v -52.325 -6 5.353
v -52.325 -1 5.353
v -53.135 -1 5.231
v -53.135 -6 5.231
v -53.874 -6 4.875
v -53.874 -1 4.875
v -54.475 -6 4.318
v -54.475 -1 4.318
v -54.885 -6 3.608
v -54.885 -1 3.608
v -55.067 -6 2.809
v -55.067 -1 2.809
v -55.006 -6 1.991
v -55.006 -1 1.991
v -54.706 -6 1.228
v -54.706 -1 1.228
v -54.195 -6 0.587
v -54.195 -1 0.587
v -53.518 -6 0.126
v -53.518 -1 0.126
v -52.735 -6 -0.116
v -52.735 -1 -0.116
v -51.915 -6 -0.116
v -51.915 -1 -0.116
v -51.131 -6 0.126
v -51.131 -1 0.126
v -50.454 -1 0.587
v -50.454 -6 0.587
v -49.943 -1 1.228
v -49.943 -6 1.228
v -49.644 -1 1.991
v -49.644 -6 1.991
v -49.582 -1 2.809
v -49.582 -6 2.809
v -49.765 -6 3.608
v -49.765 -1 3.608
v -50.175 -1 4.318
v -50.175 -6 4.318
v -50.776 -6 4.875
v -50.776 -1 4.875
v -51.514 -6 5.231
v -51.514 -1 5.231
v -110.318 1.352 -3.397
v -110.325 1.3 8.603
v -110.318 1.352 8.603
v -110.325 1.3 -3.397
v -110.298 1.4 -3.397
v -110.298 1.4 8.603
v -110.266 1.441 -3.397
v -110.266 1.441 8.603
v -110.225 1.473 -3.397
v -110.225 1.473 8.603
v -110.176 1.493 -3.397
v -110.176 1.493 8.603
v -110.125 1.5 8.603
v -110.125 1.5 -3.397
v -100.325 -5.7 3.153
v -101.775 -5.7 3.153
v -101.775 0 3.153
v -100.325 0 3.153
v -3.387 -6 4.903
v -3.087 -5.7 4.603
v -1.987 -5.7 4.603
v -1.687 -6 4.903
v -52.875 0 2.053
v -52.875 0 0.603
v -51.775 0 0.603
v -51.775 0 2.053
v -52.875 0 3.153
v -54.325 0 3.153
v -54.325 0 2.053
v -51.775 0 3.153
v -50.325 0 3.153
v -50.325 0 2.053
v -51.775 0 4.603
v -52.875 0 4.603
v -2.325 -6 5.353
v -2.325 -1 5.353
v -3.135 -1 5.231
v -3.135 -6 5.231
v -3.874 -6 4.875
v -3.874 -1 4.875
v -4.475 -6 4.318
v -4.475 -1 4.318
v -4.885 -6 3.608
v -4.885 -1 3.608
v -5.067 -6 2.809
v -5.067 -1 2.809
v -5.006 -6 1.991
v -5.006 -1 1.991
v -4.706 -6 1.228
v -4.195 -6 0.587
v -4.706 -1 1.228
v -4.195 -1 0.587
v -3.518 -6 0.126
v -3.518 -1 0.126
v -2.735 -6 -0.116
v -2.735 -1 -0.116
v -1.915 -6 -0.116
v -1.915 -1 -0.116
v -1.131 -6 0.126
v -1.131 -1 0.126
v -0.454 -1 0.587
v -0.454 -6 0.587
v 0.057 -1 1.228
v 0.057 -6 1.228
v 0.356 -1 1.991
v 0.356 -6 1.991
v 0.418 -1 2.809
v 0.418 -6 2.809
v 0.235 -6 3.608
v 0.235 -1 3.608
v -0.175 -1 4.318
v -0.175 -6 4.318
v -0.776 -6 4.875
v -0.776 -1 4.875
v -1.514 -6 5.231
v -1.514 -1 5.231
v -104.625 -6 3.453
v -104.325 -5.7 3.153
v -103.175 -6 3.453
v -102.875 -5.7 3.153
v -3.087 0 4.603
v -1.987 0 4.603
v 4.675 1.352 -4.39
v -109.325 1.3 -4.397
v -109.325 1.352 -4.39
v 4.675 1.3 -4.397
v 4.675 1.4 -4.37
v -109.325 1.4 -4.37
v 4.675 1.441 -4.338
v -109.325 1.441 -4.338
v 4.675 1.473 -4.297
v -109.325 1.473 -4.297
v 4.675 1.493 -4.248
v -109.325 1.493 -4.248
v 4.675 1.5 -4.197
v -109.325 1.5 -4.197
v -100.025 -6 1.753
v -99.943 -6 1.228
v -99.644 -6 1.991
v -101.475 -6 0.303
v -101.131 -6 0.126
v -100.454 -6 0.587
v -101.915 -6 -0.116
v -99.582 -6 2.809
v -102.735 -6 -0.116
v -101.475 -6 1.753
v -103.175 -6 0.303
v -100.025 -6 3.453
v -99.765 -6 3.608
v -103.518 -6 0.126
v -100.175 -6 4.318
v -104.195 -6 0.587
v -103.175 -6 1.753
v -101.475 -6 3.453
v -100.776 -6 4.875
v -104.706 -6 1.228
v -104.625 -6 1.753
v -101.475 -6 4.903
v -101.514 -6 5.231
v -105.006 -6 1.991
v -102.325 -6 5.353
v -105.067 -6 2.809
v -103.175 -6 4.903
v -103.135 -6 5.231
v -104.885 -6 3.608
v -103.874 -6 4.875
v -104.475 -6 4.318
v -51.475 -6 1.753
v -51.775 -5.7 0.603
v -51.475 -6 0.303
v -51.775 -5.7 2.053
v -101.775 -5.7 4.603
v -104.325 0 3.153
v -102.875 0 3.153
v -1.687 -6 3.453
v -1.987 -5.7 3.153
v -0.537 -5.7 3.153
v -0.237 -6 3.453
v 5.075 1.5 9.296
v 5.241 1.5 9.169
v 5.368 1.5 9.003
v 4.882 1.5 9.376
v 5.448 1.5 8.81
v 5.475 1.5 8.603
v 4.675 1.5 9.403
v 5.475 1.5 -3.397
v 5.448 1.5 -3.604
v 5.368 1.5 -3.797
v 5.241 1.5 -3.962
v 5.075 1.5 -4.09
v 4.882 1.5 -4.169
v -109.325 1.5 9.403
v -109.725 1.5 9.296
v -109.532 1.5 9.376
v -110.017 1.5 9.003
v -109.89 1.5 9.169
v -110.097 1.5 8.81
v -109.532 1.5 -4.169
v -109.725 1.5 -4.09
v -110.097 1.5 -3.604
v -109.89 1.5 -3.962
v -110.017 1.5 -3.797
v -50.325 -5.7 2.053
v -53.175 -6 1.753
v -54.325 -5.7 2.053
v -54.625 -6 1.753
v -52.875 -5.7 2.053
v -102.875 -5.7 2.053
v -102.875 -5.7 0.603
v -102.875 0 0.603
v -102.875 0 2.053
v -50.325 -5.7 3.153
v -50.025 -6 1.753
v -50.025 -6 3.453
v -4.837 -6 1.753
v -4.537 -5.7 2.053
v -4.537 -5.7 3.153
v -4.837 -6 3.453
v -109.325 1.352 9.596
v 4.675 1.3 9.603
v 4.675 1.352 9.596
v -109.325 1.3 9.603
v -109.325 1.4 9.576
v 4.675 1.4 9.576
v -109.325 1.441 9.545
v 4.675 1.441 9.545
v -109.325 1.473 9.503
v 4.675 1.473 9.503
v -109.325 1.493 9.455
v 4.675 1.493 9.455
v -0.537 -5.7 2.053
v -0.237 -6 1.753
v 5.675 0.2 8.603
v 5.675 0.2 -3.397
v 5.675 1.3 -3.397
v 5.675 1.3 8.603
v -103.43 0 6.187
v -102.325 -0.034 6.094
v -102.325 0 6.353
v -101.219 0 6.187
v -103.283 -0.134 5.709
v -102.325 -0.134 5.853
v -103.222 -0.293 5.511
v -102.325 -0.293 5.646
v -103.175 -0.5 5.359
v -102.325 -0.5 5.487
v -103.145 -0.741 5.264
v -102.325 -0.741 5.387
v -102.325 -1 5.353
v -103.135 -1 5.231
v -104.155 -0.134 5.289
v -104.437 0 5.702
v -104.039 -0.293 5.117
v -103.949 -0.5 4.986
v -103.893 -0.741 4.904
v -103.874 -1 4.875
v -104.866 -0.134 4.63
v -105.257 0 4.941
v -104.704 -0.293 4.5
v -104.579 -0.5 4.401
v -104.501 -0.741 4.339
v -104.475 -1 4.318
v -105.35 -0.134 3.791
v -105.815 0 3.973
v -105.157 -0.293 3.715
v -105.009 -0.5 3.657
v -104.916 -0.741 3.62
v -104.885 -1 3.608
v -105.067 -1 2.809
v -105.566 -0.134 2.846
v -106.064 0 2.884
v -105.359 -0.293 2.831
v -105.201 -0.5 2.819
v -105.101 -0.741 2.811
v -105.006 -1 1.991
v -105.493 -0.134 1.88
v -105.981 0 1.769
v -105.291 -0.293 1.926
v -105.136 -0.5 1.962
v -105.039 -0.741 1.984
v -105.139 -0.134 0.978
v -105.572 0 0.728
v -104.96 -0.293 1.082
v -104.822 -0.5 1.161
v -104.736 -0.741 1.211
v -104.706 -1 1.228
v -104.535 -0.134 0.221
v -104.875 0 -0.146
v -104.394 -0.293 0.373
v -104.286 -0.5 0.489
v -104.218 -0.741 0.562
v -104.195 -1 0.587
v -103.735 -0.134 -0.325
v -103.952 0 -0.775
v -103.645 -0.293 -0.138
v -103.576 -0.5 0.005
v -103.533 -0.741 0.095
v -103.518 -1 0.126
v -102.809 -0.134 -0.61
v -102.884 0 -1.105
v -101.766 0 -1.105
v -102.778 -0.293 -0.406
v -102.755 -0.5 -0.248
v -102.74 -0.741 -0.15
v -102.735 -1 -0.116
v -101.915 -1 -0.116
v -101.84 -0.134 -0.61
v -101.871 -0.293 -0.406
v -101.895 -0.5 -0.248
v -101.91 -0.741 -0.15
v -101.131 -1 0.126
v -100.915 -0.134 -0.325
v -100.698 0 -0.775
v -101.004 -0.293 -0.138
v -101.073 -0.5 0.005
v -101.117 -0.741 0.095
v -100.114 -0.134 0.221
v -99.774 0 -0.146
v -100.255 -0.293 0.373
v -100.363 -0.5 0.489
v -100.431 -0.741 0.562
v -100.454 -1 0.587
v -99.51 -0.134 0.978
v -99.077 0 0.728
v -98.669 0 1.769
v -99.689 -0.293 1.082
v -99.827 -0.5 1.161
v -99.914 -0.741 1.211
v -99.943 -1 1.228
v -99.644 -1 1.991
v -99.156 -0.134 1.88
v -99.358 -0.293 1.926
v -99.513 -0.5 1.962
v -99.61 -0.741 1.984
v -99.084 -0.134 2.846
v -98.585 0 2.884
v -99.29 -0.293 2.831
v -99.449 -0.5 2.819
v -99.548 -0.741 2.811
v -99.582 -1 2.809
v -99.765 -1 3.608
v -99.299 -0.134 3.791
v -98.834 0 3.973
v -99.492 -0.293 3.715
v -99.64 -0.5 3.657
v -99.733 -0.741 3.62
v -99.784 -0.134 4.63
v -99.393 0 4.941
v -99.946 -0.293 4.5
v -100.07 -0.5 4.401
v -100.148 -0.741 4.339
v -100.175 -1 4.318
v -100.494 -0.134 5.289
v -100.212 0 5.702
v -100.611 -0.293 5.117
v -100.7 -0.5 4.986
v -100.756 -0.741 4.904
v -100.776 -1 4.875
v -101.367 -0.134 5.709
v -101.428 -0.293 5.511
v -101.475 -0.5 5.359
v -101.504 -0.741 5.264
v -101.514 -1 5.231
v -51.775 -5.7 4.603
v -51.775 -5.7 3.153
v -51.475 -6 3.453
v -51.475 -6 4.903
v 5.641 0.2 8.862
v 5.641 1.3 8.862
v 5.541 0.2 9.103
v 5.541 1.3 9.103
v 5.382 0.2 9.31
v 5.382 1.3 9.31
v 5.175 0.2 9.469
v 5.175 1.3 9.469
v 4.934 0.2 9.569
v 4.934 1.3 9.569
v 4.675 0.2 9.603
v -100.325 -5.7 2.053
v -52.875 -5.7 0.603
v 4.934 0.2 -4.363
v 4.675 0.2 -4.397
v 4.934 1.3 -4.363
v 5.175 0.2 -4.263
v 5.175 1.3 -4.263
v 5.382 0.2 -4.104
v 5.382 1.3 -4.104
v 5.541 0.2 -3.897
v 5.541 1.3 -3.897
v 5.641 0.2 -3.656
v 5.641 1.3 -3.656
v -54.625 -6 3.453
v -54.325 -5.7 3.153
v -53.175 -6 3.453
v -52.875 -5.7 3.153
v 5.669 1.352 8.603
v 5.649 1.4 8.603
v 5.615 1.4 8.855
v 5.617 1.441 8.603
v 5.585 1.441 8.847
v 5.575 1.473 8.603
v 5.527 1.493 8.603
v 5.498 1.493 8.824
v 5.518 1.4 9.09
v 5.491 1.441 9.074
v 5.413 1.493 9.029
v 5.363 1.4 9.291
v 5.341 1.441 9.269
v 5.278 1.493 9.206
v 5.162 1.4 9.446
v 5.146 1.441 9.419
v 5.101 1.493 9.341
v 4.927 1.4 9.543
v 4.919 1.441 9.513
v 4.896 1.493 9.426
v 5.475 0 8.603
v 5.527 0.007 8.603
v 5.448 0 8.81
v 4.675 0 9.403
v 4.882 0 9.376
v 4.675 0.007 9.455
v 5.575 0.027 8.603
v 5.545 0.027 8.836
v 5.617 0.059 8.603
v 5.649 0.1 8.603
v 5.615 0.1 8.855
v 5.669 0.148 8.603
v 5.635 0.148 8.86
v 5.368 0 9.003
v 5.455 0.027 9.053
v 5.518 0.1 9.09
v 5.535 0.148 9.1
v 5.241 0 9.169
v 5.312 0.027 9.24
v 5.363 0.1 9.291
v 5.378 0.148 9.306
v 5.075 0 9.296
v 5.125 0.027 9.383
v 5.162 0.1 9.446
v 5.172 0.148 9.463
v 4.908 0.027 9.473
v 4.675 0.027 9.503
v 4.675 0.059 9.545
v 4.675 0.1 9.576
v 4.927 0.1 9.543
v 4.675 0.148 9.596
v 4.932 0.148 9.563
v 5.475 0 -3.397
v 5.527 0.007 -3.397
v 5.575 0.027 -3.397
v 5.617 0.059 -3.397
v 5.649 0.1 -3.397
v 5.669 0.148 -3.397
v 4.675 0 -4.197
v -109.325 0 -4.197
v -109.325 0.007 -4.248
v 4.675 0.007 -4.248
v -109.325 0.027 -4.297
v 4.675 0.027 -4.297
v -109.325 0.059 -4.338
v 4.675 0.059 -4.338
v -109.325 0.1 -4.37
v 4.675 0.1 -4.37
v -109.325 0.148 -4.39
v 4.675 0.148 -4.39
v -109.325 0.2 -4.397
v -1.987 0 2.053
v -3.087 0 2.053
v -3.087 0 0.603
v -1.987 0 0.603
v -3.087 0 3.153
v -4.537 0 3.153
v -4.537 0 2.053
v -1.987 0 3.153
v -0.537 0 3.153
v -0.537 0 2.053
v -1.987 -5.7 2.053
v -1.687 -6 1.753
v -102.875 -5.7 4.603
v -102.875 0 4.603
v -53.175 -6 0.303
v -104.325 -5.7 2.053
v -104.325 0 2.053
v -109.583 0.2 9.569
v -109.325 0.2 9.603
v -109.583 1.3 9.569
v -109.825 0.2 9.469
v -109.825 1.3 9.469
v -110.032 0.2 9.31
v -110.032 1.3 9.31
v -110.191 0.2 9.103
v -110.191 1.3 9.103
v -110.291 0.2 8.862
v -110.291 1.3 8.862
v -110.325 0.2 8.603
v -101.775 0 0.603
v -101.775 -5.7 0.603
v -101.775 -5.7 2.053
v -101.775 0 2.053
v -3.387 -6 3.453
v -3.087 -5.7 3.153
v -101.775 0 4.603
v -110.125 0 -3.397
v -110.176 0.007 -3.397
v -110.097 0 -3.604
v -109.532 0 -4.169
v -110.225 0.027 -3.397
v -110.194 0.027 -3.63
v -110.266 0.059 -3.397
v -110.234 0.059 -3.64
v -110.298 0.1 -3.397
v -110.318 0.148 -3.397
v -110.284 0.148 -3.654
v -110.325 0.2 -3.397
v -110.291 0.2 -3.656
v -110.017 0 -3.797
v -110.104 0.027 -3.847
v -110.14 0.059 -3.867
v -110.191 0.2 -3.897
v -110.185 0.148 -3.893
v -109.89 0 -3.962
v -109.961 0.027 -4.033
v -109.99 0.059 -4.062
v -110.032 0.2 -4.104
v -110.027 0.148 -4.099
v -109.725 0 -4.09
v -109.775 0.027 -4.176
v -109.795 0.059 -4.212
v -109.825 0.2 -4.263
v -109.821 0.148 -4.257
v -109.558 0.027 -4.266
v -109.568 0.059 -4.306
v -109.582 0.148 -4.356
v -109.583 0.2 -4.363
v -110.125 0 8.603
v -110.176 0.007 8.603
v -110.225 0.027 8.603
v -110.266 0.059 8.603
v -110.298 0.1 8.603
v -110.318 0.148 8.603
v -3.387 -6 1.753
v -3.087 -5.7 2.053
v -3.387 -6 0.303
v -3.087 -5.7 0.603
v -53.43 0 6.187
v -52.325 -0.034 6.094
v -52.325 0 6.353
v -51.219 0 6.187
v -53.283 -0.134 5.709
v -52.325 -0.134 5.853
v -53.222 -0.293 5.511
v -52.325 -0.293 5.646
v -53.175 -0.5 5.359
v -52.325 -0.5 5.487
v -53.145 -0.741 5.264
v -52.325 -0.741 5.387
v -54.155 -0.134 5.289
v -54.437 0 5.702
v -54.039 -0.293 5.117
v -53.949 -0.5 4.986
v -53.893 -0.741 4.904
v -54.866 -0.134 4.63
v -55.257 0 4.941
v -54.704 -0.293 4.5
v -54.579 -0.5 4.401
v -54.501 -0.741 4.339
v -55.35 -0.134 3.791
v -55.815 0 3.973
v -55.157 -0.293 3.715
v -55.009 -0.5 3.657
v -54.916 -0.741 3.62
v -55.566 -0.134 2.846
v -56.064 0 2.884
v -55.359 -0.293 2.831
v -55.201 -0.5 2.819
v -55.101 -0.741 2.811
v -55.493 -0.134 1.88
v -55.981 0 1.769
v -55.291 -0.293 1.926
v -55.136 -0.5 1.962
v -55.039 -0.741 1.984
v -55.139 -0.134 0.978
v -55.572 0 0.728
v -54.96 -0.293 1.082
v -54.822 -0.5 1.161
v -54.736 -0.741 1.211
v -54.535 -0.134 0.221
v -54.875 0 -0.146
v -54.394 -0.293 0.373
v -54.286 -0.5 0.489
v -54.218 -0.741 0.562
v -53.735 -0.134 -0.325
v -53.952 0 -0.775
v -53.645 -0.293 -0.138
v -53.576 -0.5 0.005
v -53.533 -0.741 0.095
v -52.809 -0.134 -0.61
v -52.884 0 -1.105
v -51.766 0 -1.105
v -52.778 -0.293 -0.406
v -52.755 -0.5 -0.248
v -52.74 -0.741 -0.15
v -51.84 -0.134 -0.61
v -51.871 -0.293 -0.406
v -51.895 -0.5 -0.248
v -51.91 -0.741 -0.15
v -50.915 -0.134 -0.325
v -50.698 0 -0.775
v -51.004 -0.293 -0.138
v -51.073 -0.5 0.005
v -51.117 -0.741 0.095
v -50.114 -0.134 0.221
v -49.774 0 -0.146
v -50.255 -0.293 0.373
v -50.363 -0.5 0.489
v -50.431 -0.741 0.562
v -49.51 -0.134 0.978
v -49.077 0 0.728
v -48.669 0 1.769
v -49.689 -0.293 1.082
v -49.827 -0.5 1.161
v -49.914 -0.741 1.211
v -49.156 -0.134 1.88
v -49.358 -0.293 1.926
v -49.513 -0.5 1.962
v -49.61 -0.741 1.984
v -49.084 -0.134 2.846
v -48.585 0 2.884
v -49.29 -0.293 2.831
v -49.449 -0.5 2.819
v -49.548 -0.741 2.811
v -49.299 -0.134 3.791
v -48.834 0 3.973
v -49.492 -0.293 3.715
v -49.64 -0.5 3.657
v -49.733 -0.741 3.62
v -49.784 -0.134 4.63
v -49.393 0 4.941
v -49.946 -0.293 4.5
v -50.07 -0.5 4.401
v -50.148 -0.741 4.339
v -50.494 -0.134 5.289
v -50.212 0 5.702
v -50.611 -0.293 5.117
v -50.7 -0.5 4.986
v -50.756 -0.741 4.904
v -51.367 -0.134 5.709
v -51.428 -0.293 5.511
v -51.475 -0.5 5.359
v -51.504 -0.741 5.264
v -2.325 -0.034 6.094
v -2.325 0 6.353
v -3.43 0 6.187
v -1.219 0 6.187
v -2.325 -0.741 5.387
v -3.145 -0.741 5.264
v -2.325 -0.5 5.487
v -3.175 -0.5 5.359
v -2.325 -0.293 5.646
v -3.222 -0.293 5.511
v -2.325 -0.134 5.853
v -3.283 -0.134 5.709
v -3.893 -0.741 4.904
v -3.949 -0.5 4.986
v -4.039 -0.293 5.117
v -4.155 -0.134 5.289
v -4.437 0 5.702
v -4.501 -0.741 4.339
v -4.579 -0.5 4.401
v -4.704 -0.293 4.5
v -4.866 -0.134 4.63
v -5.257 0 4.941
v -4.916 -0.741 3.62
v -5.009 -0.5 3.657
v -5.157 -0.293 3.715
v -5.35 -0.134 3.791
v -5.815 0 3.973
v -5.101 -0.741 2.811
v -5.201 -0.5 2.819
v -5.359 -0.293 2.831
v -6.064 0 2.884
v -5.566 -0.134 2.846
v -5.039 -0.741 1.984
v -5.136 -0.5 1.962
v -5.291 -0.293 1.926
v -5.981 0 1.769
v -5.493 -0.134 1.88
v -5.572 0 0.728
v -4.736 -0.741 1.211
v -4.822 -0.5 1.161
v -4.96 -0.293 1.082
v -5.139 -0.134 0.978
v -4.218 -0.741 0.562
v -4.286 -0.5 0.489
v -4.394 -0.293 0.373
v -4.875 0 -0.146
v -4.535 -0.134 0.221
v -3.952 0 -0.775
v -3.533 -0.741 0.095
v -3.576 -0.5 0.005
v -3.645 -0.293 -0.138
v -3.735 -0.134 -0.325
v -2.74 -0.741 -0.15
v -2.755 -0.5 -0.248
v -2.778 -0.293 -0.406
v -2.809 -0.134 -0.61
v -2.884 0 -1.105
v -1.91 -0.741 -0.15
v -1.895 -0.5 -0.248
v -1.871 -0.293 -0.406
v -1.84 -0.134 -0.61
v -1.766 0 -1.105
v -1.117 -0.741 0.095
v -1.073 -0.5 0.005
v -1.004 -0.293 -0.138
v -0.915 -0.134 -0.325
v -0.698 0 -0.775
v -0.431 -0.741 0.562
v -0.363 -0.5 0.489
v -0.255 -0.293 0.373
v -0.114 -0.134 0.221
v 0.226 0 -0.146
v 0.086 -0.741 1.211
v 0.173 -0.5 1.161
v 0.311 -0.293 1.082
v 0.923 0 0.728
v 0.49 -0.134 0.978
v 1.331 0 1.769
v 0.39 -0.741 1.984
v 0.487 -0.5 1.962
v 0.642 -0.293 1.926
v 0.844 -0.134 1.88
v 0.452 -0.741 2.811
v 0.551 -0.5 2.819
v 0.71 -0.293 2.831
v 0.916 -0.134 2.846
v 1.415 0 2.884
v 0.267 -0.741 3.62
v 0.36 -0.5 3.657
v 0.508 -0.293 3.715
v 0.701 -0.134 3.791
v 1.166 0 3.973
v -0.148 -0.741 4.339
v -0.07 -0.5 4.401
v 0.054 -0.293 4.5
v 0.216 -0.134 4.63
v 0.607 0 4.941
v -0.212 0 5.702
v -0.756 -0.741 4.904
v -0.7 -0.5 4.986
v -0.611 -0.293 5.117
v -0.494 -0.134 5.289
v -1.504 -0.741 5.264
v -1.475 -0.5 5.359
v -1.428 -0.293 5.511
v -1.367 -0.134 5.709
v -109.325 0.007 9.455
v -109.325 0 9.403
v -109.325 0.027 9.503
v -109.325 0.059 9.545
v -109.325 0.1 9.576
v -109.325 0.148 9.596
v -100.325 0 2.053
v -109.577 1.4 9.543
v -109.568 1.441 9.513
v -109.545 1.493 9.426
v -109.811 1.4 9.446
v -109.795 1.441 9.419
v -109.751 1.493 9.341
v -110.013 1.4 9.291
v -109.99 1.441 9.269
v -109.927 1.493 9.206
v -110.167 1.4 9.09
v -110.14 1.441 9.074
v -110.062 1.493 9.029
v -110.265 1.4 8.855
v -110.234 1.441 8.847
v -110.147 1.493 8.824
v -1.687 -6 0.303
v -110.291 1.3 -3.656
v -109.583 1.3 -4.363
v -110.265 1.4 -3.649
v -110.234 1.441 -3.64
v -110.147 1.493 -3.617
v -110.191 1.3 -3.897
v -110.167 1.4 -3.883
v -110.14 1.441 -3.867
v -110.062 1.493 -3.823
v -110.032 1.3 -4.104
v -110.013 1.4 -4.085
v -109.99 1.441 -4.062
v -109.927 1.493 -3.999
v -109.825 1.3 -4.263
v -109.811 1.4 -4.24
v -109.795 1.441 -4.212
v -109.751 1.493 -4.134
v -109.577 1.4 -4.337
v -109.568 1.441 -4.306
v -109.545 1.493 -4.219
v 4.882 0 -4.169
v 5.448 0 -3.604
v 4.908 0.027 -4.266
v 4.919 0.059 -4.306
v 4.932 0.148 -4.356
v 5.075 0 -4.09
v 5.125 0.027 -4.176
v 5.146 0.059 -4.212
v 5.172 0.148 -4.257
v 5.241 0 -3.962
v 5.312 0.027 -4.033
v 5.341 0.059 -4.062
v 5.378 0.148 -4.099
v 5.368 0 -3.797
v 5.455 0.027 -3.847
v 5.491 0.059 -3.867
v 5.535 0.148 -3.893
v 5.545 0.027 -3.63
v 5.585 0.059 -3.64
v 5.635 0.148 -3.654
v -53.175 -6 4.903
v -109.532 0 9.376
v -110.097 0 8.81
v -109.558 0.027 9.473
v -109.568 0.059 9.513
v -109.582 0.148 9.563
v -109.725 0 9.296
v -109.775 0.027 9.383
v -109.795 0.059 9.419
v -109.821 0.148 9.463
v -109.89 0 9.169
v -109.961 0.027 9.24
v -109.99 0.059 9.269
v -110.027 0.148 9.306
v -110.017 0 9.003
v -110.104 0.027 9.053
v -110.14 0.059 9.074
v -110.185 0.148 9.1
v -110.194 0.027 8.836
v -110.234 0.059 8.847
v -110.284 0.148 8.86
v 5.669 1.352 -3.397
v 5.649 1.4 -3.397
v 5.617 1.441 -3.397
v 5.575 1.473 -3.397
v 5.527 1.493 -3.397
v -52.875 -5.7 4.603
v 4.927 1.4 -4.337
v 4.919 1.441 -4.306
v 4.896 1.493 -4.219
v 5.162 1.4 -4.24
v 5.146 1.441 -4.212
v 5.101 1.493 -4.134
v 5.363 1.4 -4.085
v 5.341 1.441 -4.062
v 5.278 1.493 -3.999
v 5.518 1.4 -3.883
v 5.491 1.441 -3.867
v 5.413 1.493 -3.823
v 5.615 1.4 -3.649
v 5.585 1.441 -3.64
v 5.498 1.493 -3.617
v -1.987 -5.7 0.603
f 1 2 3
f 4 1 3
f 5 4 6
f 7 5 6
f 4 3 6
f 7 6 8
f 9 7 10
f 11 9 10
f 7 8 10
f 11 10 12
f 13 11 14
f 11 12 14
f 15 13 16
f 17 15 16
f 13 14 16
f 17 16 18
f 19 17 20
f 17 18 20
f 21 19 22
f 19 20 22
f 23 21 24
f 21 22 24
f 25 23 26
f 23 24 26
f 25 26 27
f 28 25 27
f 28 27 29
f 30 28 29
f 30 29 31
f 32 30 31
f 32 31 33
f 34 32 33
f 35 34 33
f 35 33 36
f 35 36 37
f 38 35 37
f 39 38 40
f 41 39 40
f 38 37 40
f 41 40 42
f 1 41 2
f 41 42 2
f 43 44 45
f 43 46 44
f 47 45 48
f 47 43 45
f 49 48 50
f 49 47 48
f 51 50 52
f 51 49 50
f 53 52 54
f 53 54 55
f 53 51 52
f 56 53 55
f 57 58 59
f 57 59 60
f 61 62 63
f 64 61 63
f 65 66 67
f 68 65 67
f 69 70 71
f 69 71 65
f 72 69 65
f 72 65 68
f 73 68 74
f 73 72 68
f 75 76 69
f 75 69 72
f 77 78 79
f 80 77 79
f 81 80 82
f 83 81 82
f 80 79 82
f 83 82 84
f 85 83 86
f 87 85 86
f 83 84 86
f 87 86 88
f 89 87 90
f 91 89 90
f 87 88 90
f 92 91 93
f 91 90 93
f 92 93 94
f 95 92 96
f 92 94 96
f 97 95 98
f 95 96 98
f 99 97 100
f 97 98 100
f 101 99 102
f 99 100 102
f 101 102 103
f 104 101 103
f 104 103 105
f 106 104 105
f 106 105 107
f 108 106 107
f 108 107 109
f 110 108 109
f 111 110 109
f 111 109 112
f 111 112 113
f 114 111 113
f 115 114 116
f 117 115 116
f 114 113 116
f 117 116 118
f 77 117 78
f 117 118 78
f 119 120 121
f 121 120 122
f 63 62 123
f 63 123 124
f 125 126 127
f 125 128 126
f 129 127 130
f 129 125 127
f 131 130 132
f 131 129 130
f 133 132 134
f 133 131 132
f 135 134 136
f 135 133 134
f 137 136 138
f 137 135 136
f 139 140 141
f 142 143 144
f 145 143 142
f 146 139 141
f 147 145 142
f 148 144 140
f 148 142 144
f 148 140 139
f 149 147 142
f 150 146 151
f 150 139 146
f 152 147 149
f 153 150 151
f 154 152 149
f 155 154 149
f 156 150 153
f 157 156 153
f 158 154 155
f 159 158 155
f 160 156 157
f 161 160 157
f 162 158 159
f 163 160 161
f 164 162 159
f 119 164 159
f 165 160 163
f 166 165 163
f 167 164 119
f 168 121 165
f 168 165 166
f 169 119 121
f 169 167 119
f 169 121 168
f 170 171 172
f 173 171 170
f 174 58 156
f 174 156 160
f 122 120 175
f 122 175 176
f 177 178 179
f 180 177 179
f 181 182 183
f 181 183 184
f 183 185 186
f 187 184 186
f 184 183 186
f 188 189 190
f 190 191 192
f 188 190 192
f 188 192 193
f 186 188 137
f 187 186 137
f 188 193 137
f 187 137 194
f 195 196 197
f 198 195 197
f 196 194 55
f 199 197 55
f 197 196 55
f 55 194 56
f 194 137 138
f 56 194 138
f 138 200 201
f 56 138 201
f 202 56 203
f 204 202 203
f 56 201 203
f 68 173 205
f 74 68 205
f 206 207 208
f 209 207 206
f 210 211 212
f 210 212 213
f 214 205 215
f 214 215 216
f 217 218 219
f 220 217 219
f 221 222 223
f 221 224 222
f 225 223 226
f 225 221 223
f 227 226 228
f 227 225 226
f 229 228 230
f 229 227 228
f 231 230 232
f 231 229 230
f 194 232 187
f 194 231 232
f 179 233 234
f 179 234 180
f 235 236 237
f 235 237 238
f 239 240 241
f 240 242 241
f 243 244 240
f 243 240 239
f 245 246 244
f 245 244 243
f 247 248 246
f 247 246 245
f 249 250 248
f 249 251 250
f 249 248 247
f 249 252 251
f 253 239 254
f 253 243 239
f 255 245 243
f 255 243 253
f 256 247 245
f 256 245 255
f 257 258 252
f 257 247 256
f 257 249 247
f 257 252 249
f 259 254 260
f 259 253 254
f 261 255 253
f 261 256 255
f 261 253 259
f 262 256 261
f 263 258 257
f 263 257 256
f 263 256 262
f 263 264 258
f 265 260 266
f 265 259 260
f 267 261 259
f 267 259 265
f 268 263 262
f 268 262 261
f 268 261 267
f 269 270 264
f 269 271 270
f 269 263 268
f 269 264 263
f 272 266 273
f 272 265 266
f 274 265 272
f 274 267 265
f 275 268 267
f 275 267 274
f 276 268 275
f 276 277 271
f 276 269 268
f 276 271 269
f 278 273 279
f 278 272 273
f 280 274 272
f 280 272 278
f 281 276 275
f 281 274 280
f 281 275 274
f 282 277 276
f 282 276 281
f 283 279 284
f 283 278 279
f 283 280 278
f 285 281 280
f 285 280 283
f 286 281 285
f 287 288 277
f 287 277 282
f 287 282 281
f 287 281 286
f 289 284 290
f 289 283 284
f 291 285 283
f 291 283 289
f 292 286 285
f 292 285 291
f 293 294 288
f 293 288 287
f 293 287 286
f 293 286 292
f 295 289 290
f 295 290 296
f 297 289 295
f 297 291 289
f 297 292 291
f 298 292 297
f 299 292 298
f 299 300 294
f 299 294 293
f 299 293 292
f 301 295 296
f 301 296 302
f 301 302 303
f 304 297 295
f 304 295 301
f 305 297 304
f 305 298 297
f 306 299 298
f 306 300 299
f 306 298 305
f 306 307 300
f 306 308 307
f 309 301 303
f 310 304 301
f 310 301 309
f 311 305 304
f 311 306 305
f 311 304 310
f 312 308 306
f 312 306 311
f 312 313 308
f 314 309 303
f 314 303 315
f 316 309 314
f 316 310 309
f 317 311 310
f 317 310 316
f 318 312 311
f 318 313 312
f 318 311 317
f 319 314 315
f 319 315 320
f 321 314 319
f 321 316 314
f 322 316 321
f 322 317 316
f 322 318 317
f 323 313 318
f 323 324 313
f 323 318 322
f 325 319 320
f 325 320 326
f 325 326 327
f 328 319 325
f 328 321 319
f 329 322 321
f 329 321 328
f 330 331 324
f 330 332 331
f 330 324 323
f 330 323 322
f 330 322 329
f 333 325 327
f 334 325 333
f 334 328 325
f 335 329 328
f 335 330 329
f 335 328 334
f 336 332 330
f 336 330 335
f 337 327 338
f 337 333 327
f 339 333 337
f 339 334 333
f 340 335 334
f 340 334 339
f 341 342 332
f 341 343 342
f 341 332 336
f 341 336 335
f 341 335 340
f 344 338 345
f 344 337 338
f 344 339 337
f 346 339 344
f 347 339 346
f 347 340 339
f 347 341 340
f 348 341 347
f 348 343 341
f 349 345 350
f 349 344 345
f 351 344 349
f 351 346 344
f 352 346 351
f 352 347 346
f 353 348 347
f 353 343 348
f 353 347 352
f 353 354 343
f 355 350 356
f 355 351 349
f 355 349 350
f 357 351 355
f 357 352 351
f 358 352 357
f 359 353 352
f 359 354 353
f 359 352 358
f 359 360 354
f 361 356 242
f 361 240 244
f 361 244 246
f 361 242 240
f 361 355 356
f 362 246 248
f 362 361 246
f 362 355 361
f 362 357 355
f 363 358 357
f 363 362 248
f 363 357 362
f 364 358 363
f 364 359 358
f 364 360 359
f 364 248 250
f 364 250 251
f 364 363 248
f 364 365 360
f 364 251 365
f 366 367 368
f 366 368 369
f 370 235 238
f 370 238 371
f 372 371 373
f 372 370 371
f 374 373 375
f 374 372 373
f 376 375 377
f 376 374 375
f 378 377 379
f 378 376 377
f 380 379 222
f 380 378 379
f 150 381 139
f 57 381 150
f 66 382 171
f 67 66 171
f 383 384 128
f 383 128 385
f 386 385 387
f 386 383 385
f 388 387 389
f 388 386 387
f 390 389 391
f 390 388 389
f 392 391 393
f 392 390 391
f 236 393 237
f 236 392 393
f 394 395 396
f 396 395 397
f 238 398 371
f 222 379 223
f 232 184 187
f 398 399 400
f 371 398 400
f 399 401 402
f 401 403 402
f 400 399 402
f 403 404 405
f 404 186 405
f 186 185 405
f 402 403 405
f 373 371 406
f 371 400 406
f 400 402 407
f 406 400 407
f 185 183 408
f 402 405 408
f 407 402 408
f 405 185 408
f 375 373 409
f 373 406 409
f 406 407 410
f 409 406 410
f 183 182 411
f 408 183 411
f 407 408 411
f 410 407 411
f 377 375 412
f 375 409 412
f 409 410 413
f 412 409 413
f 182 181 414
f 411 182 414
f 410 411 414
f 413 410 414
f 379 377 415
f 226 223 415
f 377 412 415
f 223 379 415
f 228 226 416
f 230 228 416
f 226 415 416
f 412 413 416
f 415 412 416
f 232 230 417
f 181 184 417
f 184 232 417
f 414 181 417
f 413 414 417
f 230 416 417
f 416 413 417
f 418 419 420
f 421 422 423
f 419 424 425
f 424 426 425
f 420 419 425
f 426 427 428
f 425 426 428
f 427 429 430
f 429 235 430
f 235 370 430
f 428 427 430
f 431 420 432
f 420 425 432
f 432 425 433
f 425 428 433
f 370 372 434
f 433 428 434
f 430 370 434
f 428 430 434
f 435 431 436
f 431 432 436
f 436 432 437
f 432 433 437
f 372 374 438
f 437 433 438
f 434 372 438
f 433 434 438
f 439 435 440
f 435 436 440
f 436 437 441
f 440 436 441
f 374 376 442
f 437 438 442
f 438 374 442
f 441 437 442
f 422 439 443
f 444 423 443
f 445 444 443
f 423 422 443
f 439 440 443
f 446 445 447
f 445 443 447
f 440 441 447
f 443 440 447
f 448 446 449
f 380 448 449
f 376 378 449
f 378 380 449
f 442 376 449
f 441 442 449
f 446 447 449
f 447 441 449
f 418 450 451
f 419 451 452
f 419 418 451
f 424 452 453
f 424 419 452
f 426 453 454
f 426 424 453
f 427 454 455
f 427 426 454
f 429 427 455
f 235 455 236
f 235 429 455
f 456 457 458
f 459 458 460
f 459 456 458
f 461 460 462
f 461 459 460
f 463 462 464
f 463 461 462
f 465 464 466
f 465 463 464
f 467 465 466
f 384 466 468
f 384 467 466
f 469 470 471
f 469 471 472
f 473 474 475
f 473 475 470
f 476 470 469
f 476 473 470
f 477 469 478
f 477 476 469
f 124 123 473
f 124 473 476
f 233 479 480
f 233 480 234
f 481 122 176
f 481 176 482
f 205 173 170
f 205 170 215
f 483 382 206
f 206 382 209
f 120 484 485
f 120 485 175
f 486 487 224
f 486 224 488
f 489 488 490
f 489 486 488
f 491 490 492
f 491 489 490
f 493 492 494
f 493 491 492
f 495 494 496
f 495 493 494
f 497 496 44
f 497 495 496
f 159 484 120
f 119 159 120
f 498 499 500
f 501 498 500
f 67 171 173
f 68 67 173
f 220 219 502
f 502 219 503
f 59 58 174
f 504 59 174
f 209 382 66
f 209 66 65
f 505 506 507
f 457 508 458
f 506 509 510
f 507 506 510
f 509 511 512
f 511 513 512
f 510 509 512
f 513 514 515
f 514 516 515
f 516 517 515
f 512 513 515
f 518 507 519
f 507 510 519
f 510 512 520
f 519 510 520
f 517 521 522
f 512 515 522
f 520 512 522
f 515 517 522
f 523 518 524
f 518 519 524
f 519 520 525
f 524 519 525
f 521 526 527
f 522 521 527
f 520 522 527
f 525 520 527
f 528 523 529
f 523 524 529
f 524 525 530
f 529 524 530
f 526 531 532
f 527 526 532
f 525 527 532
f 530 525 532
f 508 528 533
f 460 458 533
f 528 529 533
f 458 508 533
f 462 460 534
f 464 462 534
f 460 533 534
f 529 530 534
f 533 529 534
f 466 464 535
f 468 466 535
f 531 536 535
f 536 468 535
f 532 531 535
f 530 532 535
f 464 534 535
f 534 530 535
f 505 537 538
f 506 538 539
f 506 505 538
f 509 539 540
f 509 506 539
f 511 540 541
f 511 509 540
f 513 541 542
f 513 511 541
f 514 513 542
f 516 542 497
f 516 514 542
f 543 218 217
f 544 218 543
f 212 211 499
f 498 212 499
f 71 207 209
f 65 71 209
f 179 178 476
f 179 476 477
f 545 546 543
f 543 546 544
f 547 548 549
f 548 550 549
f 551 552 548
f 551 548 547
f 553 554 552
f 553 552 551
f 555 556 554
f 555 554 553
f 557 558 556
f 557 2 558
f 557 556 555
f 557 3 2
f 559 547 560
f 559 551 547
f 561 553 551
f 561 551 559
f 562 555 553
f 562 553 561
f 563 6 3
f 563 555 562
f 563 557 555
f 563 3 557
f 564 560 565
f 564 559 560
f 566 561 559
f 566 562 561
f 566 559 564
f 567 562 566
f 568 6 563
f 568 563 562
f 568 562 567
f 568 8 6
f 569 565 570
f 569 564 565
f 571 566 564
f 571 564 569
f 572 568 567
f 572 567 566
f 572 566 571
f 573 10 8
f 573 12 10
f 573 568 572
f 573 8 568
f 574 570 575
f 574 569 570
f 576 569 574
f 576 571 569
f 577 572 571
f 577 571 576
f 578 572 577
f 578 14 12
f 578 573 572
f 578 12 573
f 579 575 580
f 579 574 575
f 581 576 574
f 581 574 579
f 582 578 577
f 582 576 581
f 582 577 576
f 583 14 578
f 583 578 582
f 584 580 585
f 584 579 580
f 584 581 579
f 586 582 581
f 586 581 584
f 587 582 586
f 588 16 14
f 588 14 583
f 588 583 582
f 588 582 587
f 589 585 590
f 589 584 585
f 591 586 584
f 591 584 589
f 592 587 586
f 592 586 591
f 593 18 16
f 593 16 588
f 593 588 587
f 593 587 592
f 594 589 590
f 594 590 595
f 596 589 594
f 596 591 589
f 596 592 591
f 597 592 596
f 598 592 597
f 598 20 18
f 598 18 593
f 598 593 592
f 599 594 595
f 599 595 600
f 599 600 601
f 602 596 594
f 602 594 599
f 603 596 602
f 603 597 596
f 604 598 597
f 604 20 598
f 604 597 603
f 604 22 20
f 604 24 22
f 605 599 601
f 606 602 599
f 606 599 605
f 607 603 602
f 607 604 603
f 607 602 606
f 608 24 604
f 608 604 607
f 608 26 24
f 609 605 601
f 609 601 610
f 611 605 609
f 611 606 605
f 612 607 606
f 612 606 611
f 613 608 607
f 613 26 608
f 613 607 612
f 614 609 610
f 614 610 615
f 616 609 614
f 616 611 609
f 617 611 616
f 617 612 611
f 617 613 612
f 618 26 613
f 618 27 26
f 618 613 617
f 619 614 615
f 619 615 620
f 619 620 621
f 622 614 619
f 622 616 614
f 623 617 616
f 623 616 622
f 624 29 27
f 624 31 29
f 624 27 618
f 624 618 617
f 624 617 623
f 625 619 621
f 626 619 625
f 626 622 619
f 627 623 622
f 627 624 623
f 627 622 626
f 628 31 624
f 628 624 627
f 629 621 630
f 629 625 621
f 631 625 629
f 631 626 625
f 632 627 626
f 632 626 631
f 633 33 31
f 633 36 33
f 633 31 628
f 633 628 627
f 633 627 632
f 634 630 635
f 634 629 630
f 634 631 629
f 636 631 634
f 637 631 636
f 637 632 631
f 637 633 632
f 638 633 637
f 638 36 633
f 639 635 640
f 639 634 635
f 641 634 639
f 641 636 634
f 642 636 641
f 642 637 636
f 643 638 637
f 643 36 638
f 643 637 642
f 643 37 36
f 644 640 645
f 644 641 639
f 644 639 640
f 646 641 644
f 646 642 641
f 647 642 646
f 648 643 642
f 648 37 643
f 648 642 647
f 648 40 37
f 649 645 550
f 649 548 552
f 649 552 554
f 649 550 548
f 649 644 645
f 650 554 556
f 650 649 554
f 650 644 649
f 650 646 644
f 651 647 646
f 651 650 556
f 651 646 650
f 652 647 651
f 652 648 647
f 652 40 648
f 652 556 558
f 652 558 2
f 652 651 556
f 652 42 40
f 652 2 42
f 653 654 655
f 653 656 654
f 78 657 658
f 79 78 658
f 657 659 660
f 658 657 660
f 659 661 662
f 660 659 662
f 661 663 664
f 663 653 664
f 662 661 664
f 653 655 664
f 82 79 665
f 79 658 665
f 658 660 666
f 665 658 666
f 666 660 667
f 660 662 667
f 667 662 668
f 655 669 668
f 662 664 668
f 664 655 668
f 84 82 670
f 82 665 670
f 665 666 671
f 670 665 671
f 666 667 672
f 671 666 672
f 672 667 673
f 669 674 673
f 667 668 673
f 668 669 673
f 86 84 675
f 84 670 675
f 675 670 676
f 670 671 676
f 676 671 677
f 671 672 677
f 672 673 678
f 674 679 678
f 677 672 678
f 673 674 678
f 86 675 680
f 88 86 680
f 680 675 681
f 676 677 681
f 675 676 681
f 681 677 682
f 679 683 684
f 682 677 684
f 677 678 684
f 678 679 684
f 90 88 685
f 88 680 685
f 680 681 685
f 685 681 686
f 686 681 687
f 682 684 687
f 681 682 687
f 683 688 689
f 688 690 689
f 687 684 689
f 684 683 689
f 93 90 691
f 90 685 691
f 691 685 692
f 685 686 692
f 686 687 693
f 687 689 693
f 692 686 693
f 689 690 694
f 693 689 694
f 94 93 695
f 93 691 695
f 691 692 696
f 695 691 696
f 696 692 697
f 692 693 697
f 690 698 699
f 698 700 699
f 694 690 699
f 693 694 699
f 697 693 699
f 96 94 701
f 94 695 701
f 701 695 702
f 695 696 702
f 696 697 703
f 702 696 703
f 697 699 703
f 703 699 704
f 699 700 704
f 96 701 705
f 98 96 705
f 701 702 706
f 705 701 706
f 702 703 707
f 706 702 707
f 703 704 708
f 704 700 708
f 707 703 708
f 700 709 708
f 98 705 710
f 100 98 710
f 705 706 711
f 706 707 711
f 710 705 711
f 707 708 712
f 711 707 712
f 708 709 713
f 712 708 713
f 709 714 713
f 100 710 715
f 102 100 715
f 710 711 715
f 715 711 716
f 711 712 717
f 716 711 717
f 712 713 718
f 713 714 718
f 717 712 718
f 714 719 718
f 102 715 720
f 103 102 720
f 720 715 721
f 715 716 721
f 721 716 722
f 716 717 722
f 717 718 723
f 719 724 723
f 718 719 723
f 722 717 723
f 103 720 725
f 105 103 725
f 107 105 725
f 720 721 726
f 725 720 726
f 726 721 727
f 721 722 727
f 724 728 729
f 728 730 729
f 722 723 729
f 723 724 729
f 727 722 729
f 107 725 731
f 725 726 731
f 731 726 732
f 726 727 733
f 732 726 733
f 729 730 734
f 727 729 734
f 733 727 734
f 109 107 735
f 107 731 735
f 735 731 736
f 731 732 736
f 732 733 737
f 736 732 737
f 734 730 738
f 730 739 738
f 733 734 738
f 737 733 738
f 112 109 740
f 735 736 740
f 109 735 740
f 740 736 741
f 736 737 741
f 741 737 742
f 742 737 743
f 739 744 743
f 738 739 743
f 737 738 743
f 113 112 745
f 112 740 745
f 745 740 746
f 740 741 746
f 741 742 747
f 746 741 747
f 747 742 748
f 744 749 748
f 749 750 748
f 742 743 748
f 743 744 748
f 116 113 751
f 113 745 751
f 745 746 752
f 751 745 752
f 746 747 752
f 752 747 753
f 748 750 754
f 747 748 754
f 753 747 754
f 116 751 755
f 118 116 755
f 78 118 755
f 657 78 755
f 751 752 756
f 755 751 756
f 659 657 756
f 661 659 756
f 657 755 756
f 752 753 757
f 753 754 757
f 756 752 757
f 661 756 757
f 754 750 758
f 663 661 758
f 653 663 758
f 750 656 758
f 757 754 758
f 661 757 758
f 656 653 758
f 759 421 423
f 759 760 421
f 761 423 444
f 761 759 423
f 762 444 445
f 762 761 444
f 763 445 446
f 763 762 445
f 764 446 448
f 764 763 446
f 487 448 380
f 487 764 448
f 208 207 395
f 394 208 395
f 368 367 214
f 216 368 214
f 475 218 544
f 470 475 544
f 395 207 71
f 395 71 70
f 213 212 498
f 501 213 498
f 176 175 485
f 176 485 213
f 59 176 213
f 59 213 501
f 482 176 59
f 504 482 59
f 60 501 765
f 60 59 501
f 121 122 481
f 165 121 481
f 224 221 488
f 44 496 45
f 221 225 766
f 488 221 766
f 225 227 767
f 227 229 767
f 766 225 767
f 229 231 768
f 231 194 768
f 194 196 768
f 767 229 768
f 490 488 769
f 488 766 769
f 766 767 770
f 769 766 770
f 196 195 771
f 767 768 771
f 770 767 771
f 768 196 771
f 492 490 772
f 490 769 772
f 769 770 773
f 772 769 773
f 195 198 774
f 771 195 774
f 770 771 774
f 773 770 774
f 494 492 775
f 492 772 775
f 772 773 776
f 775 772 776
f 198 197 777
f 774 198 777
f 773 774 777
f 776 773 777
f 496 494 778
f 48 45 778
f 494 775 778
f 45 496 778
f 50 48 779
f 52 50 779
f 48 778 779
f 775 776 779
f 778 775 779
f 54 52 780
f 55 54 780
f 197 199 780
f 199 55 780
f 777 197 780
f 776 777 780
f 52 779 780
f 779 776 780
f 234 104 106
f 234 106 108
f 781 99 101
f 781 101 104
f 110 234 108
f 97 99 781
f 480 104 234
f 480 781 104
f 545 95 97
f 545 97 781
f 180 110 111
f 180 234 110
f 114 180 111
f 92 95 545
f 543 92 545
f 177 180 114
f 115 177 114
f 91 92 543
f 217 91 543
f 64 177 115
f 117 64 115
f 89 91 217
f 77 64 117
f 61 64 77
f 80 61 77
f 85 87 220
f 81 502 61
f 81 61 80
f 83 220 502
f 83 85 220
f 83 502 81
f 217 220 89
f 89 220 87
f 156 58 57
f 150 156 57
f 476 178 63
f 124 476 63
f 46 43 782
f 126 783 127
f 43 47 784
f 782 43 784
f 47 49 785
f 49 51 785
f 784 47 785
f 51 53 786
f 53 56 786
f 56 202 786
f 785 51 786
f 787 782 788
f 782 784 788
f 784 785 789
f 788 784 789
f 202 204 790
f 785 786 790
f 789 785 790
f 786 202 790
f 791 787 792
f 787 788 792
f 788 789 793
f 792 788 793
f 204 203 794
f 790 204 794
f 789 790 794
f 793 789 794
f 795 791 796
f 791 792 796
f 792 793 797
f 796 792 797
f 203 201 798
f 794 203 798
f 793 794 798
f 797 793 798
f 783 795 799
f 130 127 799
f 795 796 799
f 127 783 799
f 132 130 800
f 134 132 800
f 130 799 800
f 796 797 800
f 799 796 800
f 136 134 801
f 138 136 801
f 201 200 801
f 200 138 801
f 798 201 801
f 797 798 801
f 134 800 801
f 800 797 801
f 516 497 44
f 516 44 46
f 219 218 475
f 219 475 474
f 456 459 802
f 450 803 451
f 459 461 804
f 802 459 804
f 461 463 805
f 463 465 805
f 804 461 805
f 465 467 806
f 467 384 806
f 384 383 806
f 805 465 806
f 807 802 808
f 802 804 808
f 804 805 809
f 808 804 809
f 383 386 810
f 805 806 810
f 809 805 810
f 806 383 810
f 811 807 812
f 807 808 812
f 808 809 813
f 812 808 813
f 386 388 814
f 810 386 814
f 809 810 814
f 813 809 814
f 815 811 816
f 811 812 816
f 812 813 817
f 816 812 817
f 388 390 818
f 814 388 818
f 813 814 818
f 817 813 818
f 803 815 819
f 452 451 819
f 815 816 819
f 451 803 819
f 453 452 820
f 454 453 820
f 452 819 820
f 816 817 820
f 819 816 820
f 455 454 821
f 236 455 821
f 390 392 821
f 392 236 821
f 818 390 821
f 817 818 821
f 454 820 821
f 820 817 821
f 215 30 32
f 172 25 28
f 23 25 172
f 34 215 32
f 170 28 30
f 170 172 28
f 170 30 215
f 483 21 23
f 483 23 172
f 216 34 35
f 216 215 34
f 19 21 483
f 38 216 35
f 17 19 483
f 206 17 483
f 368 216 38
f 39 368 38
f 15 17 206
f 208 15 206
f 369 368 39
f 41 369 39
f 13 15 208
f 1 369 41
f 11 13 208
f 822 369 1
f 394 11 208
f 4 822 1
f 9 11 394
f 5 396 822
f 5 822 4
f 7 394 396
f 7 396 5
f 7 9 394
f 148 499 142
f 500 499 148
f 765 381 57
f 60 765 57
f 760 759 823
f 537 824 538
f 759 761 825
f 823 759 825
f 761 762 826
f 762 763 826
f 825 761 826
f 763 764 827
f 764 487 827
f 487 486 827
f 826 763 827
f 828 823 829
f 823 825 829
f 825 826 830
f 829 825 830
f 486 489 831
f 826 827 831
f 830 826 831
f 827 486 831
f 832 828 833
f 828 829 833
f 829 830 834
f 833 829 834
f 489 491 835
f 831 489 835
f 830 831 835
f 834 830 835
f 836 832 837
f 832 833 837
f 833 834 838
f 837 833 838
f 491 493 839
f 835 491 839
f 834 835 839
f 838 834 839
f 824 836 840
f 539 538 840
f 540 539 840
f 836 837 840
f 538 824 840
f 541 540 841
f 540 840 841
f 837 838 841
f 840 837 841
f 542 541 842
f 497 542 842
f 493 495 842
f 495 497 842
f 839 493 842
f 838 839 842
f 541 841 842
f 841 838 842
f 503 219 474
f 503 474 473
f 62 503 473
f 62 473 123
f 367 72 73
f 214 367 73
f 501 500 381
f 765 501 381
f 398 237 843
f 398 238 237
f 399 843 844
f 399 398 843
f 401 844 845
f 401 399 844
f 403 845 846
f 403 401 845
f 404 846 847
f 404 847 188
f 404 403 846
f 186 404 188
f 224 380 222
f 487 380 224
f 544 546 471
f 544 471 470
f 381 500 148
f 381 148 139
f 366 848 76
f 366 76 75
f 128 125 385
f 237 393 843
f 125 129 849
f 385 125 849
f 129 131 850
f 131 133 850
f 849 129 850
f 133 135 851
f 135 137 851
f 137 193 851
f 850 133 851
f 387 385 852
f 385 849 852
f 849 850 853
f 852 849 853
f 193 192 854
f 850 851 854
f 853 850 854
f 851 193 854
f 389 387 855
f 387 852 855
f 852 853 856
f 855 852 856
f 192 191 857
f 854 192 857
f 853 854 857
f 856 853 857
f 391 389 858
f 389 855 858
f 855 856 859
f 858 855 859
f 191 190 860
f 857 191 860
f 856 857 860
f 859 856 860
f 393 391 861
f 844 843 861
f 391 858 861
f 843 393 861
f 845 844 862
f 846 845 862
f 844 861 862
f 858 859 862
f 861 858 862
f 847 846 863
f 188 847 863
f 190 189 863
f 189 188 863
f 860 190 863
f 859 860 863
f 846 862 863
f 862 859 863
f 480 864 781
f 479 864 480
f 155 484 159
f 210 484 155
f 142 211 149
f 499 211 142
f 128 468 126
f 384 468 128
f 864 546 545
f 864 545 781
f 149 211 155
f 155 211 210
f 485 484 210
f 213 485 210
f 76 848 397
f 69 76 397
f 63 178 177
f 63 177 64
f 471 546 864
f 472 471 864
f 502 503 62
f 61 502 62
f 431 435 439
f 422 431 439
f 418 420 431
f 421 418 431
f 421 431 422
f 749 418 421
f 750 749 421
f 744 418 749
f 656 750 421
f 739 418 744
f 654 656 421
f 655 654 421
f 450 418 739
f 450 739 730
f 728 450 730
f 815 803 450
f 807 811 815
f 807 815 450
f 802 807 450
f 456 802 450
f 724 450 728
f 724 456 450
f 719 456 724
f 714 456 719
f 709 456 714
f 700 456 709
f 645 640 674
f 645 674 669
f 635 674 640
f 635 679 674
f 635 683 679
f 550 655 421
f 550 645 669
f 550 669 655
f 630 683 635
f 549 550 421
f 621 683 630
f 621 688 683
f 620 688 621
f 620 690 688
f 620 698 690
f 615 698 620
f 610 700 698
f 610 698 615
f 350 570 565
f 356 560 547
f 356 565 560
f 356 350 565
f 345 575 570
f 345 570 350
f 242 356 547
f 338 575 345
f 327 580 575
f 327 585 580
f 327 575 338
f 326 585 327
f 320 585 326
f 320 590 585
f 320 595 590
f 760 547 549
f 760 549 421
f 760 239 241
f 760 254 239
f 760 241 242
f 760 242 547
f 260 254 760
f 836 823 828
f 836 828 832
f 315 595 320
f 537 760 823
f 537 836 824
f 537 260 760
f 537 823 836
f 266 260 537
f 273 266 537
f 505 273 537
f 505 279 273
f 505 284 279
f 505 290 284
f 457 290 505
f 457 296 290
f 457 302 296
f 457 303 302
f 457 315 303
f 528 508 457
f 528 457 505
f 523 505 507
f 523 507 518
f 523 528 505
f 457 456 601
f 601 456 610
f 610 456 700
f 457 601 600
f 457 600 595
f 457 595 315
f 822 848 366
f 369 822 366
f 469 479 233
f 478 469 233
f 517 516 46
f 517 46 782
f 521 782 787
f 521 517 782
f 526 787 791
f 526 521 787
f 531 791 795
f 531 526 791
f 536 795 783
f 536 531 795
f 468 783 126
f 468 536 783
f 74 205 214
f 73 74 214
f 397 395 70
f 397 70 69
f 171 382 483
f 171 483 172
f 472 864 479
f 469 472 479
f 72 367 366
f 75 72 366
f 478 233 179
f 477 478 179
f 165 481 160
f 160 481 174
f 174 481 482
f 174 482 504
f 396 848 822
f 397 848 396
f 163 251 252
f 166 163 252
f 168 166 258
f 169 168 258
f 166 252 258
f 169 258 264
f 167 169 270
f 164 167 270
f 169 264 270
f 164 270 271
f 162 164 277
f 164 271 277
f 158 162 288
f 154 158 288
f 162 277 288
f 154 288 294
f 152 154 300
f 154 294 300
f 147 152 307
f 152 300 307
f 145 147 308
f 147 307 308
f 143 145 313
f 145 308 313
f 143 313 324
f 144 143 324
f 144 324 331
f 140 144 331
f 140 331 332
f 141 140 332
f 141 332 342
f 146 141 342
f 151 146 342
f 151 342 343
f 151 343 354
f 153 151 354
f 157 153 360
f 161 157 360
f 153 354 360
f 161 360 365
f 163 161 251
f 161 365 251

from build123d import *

# Parameters (mm, degrees)
BOSS_EXTRUDE1_DEPTH = 1.5
SKETCH2_R           = 2.75
BOSS_EXTRUDE2_DEPTH = 6
SKETCH3_W           = 1.1
SKETCH3_H           = 1.45
SKETCH3_W_2         = 1.45
SKETCH3_H_2         = 1.1
SKETCH3_W_3         = 4
SKETCH3_H_3         = 4
CUT_EXTRUDE1_DEPTH  = 6
CHAMFER1_SIZE       = 0.3
FILLET1_R           = 1
FILLET3_R           = 0.2


with BuildPart() as part:
    # Sketch1 → Boss-Extrude1 (new body)
    with BuildSketch(Plane(origin=(0, 0, 0), x_dir=(1, 0, 0), z_dir=(0, 1, 0))):
        with BuildLine():
            Line((-109.324675649, 4.396717546), (4.675324351, 4.396717546))
            ThreePointArc((4.675324351, 4.396717546), (5.382431132, 4.103824327), (5.675324351, 3.396717546))
            Line((5.675324351, 3.396717546), (5.675324351, -8.603282454))
            ThreePointArc((5.675324351, -8.603282454), (5.382431132, -9.310389235), (4.675324351, -9.603282454))
            Line((4.675324351, -9.603282454), (-109.324675649, -9.603282454))
            ThreePointArc((-109.324675649, -9.603282454), (-110.03178243, -9.310389235), (-110.324675649, -8.603282454))
            Line((-110.324675649, -8.603282454), (-110.324675649, 3.396717546))
            ThreePointArc((-110.324675649, 3.396717546), (-110.03178243, 4.103824327), (-109.324675649, 4.396717546))
        make_face()
    extrude(amount=BOSS_EXTRUDE1_DEPTH)

    # Sketch2 → Boss-Extrude2 (add)
    with BuildSketch(Plane.XZ):
        with Locations(Location((-52.324675649, 2.603282454, 0), (0, 0, 90))):
            Circle(SKETCH2_R)
        with Locations(Location((-102.324675649, 2.603282454, 0), (0, 0, 90))):
            Circle(SKETCH2_R)
        with Locations(Location((-2.324675649, 2.603282454, 0), (0, 0, 90))):
            Circle(SKETCH2_R)
    extrude(amount=BOSS_EXTRUDE2_DEPTH)

    # Sketch3 → Cut-Extrude1 (cut)
    with BuildSketch(Plane.XZ.offset(6)):
        with Locations((-52.324675649, 3.878282454)):
            Rectangle(SKETCH3_W, SKETCH3_H)
        with Locations((-51.049675649, 2.603282454)):
            Rectangle(SKETCH3_W_2, SKETCH3_H_2)
        with Locations((-52.324675649, 2.603282454)):
            Rectangle(SKETCH3_W, SKETCH3_H_2)
        with Locations((-53.599675649, 2.603282454)):
            Rectangle(SKETCH3_W_2, SKETCH3_H_2)
        with Locations((-52.324675649, 1.328282454)):
            Rectangle(SKETCH3_W, SKETCH3_H)
        with Locations((-2.53698339, 2.603282454)):
            Rectangle(SKETCH3_W_3, SKETCH3_H_2)
        with Locations((-2.53698339, 2.603282454)):
            Rectangle(SKETCH3_W, SKETCH3_H_3)
        with Locations((-102.324675649, 2.603282454)):
            Rectangle(SKETCH3_W, SKETCH3_H_3)
        with Locations((-102.324675649, 2.603282454)):
            Rectangle(SKETCH3_W_3, SKETCH3_H_2)
    extrude(amount=-CUT_EXTRUDE1_DEPTH, mode=Mode.SUBTRACT)

    # Chamfer1
    chamfer1_edges = [part.edges().sort_by_distance(p)[0] for p in [
        (-1.26198339, -6, 2.053282454),
        (-3.08698339, -6, 3.878282454),
        (-4.53698339, -6, 2.603282454),
        (-3.81198339, -6, 2.053282454),
        (-3.08698339, -6, 1.328282454),
        (-2.53698339, -6, 0.603282454),
        (-3.81198339, -6, 3.153282454),
        (-0.53698339, -6, 2.603282454),
        (-1.26198339, -6, 3.153282454),
        (-2.53698339, -6, 4.603282454),
        (-1.98698339, -6, 3.878282454),
        (-1.98698339, -6, 1.328282454),
        (-103.599675649, -6, 2.053282454),
        (-102.874675649, -6, 1.328282454),
        (-102.324675649, -6, 0.603282454),
        (-101.049675649, -6, 2.053282454),
        (-102.874675649, -6, 3.878282454),
        (-104.324675649, -6, 2.603282454),
        (-102.324675649, -6, 4.603282454),
        (-101.774675649, -6, 3.878282454),
        (-101.774675649, -6, 1.328282454),
        (-100.324675649, -6, 2.603282454),
        (-101.049675649, -6, 3.153282454),
        (-103.599675649, -6, 3.153282454),
        (-51.774675649, -6, 3.878282454),
        (-51.049675649, -6, 3.153282454),
        (-50.324675649, -6, 2.603282454),
        (-51.774675649, -6, 1.328282454),
        (-53.599675649, -6, 3.153282454),
        (-52.324675649, -6, 4.603282454),
        (-52.874675649, -6, 3.878282454),
        (-54.324675649, -6, 2.603282454),
        (-53.599675649, -6, 2.053282454),
        (-52.874675649, -6, 1.328282454),
        (-52.324675649, -6, 0.603282454),
        (-51.049675649, -6, 2.053282454),
    ]]
    chamfer(chamfer1_edges, length=CHAMFER1_SIZE)

    # Fillet1
    fillet1_edges = [part.edges().sort_by_distance(p)[0] for p in [
        (-52.324675649, 0, -0.146717546),
        (-102.324675649, 0, -0.146717546),
        (-2.324675649, 0, -0.146717546),
    ]]
    fillet(fillet1_edges, radius=FILLET1_R)

    # Fillet3
    fillet3_edges = [part.edges().sort_by_distance(p)[0] for p in [
        (5.382431132, 1.5, 9.310389235),
        (-52.324675649, 0, 9.603282454),
        (-110.03178243, 0, 9.310389235),
        (5.675324351, 1.5, 2.603282454),
        (5.382431132, 1.5, -4.103824327),
        (-52.324675649, 1.5, -4.396717546),
        (-110.03178243, 1.5, -4.103824327),
        (-110.324675649, 1.5, 2.603282454),
        (-110.03178243, 1.5, 9.310389235),
        (-52.324675649, 1.5, 9.603282454),
        (-110.324675649, 0, 2.603282454),
        (-110.03178243, 0, -4.103824327),
        (-52.324675649, 0, -4.396717546),
        (5.382431132, 0, -4.103824327),
        (5.675324351, 0, 2.603282454),
        (5.382431132, 0, 9.310389235),
    ]]
    fillet(fillet3_edges, radius=FILLET3_R)


solid = part.part
